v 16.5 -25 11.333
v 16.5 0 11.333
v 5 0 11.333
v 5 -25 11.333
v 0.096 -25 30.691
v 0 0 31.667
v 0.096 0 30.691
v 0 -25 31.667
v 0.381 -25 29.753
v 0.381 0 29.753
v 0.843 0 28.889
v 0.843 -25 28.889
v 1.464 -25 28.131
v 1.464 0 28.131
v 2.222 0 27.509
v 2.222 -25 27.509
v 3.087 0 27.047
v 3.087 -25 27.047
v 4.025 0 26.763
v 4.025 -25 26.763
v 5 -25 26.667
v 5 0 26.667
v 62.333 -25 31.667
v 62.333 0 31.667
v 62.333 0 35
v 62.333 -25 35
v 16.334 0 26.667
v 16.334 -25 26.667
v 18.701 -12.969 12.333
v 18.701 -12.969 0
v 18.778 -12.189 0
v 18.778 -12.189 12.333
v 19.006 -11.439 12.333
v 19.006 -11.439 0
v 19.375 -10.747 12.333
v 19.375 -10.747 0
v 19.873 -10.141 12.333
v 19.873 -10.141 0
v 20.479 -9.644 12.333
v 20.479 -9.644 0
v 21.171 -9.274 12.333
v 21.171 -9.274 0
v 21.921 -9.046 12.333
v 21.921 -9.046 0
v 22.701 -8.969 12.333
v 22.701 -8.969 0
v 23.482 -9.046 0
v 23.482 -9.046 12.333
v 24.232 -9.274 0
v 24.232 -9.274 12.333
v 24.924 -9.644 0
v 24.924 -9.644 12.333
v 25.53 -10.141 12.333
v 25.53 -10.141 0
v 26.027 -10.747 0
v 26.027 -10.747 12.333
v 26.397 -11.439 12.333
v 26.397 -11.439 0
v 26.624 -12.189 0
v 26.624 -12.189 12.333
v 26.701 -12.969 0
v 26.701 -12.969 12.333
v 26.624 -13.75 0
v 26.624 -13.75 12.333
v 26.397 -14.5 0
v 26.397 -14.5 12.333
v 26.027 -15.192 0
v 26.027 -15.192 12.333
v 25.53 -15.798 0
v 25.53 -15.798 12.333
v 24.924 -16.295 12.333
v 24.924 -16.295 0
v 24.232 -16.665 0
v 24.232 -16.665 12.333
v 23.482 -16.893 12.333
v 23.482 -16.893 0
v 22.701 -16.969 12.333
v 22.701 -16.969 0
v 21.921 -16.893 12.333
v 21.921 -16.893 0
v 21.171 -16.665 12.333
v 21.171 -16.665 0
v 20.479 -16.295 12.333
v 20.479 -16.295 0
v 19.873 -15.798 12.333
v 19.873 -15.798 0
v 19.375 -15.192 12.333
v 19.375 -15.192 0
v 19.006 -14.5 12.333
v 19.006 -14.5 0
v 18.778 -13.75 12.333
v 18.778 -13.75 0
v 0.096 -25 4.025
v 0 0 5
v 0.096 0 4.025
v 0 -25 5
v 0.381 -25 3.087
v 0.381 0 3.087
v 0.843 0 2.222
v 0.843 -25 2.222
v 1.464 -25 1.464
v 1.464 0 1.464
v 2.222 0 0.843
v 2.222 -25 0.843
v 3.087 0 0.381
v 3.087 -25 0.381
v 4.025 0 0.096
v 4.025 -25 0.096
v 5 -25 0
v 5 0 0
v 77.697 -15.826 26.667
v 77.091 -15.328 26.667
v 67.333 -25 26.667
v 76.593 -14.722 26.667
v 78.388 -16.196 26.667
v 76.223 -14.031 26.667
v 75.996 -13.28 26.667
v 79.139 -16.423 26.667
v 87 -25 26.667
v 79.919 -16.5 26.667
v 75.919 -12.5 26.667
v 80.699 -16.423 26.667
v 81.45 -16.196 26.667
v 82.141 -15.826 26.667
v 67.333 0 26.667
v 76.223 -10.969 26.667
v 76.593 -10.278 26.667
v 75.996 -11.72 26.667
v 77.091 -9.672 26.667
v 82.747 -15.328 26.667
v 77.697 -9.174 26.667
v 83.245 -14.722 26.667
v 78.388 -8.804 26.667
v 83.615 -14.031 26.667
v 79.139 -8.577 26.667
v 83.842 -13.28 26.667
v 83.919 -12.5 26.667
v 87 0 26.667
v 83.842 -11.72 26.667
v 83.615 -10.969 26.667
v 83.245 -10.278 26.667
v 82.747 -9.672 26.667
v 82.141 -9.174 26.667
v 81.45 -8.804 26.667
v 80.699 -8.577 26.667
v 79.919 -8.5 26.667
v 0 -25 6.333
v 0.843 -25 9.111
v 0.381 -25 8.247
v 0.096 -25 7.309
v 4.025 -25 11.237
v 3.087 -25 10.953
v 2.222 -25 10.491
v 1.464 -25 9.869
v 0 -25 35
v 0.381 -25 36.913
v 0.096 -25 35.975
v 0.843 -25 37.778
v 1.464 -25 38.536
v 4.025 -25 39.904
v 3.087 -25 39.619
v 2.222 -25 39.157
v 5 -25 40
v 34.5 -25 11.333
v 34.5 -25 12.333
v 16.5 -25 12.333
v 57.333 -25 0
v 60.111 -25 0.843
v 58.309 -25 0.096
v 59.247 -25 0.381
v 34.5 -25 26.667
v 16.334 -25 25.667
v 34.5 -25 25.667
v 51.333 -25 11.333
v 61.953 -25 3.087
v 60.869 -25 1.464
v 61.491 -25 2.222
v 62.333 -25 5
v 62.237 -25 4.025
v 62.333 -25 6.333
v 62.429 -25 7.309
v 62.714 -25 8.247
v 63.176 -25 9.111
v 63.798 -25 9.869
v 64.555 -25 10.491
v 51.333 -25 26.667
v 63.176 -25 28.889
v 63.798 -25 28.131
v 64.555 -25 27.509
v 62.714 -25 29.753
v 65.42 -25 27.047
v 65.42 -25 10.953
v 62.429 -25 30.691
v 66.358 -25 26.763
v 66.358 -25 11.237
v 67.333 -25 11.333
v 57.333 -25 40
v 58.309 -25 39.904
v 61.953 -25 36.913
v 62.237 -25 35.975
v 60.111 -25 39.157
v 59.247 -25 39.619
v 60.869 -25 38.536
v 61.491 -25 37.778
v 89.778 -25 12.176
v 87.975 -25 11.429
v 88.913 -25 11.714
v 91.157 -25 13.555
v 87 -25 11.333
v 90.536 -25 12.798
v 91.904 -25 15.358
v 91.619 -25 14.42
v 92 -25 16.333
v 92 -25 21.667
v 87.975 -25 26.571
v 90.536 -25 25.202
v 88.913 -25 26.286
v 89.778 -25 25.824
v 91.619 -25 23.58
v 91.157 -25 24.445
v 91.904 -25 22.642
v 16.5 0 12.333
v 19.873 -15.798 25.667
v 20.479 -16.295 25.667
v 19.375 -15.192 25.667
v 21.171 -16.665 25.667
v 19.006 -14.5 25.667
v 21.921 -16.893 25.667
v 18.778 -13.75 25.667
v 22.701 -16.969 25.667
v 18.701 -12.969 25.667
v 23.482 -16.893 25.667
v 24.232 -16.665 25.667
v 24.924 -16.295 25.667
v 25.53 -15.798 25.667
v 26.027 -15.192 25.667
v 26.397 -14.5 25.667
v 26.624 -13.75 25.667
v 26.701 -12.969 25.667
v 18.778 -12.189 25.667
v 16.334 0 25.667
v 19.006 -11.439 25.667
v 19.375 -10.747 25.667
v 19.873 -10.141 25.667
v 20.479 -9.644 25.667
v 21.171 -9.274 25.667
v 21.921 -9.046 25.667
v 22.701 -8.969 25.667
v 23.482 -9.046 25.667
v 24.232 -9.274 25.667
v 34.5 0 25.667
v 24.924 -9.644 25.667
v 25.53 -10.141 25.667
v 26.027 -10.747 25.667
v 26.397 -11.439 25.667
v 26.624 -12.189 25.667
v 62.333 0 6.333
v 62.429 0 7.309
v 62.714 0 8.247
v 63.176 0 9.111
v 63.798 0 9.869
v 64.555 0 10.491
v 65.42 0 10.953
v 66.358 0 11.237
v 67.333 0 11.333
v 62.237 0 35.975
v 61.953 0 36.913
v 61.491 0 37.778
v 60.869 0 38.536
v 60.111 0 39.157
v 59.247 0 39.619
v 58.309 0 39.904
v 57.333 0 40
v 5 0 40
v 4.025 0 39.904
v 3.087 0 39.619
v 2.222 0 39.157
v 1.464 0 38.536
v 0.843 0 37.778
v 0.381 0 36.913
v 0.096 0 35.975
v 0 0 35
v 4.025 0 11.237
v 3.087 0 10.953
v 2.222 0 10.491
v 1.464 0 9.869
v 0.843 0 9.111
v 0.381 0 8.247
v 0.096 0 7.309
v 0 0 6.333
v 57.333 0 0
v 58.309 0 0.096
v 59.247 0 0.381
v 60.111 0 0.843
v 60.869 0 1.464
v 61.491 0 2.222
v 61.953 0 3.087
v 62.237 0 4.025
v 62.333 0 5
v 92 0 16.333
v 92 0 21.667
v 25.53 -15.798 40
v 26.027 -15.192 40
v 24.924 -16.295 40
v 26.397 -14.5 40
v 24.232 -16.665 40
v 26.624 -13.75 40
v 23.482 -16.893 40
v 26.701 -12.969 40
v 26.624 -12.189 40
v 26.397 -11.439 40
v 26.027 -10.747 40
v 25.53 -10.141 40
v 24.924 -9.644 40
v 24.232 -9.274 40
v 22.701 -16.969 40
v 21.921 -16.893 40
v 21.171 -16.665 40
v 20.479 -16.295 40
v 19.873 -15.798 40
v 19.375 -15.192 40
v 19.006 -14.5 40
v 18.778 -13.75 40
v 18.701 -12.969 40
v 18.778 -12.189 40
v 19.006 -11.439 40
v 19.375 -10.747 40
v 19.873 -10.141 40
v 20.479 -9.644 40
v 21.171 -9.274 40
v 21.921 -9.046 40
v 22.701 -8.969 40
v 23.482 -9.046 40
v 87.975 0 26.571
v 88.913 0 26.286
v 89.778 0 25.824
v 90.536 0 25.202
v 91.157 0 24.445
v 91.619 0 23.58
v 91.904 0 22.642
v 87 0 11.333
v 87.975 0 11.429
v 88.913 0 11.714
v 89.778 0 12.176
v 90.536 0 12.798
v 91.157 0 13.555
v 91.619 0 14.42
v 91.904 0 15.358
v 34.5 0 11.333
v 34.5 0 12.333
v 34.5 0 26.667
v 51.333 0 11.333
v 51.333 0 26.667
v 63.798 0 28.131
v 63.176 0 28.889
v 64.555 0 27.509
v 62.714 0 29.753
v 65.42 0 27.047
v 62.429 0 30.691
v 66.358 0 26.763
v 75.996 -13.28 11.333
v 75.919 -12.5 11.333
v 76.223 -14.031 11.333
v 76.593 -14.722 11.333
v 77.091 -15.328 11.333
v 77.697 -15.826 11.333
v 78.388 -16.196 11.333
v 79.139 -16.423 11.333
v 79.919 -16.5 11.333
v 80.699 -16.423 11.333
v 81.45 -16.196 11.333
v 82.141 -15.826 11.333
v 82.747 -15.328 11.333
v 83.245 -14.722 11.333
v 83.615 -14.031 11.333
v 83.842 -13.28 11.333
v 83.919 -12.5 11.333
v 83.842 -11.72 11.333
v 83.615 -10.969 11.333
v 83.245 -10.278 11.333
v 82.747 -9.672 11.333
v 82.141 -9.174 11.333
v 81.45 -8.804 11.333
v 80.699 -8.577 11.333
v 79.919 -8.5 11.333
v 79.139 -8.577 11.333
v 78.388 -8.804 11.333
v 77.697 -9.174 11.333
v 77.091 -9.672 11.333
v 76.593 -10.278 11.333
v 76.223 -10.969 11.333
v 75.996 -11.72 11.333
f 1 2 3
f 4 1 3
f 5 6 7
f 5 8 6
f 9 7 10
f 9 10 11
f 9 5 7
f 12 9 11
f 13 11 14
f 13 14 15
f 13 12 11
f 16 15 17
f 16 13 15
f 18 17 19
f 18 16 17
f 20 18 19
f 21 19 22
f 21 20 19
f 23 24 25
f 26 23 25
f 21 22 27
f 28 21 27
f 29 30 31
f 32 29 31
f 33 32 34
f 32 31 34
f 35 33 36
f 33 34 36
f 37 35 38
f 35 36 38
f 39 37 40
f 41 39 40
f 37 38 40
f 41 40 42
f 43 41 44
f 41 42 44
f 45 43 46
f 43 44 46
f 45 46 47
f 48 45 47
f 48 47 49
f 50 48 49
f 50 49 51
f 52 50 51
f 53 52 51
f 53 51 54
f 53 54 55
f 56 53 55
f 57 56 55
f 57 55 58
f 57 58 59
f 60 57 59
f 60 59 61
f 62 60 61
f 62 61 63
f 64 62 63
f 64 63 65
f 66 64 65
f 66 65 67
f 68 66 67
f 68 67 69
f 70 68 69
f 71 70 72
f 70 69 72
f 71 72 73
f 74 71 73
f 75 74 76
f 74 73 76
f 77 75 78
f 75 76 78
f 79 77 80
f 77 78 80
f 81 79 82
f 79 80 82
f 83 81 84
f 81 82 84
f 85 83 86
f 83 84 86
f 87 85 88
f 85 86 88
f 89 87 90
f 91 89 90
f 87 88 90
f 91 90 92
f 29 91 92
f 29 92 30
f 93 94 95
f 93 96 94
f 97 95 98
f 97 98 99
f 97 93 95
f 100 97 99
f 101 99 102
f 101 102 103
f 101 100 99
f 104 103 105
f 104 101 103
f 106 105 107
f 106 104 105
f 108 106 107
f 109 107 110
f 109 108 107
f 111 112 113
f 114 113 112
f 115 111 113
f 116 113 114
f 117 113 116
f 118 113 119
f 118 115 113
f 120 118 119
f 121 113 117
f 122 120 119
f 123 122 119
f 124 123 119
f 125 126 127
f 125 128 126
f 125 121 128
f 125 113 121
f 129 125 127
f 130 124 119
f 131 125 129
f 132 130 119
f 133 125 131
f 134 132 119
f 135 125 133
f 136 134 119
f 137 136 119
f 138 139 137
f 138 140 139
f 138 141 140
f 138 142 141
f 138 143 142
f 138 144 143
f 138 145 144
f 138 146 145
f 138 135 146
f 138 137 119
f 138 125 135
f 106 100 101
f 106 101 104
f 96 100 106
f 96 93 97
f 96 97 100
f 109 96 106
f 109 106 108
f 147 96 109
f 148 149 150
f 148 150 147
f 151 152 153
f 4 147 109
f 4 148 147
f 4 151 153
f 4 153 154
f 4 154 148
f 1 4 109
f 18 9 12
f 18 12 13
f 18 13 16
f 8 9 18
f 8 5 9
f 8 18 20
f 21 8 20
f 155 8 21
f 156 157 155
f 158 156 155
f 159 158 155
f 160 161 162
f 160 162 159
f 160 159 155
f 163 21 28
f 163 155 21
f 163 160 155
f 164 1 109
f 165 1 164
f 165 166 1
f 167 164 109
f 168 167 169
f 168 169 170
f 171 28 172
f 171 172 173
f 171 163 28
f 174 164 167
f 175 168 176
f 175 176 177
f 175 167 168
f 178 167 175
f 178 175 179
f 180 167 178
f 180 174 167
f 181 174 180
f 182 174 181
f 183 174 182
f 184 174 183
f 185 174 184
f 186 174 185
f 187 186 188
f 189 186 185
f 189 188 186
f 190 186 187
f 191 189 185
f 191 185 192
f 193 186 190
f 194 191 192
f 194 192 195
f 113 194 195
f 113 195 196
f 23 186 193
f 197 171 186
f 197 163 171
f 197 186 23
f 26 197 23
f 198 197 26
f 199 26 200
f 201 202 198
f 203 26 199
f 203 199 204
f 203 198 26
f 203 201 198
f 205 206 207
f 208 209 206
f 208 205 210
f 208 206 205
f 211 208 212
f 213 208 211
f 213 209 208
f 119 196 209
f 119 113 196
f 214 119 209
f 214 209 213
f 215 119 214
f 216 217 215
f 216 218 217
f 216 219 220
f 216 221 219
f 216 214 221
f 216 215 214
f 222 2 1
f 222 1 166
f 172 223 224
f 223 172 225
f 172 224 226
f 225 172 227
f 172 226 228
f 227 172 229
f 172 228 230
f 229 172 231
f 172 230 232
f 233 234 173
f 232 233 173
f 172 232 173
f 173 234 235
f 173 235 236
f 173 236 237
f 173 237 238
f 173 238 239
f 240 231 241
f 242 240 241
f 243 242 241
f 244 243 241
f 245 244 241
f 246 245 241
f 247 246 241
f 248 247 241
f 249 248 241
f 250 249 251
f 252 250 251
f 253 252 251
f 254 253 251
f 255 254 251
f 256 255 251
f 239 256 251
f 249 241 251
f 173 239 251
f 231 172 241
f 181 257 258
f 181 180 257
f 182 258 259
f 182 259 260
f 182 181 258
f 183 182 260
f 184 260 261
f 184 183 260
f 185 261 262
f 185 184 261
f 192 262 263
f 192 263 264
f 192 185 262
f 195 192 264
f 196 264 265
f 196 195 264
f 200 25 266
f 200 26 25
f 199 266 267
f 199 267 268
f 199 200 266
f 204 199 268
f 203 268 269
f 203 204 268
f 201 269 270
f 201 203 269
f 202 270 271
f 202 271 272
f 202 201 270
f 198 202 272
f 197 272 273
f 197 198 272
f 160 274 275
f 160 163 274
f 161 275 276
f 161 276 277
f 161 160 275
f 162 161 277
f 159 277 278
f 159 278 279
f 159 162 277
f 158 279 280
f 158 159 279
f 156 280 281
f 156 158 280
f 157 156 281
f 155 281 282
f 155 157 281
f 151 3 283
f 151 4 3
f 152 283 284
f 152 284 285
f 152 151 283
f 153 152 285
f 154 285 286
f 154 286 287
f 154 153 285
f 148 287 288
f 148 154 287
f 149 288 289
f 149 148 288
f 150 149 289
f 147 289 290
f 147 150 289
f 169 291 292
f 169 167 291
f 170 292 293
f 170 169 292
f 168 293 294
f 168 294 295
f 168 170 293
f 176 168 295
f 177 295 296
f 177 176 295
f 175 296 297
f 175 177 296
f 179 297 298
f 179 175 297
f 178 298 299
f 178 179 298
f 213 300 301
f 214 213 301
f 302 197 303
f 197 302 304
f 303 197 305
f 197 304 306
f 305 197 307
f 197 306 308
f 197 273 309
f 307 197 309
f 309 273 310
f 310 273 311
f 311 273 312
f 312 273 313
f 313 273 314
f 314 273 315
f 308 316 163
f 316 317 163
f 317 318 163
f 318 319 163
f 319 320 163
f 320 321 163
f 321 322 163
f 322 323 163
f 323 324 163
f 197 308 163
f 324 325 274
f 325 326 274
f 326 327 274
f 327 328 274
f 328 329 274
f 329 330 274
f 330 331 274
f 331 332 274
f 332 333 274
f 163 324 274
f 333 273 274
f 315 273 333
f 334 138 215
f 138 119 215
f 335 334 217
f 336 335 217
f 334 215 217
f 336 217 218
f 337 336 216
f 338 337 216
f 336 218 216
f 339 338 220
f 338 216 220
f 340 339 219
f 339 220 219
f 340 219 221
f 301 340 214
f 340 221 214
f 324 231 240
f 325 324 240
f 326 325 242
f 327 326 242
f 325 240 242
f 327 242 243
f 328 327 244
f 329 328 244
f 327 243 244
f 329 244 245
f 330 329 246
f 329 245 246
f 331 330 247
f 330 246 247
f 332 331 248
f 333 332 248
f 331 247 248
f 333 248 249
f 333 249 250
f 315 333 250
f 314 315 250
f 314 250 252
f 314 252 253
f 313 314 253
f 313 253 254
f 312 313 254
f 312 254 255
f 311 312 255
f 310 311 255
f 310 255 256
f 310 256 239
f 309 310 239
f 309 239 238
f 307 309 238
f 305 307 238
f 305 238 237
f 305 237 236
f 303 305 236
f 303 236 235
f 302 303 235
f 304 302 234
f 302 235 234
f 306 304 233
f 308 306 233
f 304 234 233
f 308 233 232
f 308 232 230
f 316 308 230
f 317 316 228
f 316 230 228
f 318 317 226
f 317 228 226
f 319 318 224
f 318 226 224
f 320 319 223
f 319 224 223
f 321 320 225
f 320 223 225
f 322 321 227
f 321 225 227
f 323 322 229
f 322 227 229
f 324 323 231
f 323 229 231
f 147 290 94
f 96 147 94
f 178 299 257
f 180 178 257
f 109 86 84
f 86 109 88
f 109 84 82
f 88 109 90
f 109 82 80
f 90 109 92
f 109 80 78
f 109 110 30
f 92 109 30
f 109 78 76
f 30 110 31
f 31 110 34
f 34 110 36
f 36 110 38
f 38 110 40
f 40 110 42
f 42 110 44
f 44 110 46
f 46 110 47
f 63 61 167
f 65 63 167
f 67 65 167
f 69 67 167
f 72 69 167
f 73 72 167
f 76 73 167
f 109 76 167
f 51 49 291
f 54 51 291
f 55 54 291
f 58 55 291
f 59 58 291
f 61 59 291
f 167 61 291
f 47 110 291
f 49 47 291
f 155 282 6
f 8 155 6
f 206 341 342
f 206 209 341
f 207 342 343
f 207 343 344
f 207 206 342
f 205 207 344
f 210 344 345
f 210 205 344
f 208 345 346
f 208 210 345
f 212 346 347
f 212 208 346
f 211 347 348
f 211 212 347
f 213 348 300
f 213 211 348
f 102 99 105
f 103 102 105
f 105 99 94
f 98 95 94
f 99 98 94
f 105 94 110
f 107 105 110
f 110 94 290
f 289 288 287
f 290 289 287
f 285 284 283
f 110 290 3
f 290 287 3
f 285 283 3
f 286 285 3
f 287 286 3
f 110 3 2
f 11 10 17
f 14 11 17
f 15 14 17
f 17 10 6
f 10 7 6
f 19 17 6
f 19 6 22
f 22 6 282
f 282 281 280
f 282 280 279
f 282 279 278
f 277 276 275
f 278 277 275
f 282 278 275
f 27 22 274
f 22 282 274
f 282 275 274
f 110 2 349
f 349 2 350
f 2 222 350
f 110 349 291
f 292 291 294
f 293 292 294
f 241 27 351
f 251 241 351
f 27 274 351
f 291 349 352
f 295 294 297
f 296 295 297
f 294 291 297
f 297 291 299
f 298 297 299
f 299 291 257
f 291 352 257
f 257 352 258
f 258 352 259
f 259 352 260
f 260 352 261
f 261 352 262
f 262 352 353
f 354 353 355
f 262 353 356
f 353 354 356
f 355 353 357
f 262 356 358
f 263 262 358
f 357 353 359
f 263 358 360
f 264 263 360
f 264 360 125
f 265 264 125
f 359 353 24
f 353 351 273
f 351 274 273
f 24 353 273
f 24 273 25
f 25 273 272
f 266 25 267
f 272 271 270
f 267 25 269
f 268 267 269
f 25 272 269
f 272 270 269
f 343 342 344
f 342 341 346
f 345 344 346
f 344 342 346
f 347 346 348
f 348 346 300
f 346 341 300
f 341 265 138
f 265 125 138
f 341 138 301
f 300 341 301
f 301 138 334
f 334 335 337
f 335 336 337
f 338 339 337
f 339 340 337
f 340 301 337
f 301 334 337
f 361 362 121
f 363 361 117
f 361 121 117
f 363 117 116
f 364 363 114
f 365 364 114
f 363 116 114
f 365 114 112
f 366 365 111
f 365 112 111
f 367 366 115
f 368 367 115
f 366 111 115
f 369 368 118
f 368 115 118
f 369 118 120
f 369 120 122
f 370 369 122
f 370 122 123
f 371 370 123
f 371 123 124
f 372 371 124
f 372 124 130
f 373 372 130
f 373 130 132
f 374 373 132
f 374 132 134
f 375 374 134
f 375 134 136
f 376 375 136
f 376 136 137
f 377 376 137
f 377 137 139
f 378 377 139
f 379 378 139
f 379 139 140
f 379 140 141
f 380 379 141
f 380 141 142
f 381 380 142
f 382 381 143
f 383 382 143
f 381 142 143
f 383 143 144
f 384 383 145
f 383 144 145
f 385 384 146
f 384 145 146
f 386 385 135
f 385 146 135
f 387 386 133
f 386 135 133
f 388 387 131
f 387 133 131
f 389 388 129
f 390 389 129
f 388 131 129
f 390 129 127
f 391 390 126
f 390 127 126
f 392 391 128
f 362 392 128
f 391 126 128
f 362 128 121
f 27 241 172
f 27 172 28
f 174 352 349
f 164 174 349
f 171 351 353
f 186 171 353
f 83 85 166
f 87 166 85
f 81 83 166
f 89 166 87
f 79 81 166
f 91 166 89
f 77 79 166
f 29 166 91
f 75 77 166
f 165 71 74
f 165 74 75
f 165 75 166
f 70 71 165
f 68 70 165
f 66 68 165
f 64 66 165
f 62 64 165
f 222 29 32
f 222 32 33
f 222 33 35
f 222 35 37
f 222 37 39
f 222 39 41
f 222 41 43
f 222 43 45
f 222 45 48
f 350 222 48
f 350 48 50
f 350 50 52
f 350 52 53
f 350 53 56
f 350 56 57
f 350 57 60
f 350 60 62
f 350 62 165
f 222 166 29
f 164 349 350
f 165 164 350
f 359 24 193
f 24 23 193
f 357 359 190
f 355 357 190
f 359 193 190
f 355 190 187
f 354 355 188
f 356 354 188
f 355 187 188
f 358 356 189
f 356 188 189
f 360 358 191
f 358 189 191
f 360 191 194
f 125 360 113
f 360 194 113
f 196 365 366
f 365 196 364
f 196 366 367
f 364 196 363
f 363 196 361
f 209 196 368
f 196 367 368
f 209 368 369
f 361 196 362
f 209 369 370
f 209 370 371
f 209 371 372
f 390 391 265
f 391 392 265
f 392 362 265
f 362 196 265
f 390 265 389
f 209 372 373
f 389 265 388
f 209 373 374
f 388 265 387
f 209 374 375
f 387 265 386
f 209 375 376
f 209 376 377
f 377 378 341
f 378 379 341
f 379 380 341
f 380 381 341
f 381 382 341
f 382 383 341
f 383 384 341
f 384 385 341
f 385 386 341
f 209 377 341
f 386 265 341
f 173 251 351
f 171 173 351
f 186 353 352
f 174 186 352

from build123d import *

# Parameters (mm, degrees)
F0_W     = 18.1666671749
F0_H     = 1
F0_W_2   = 29.6666571914
F0_H_2   = 15.3333324809
F0_W_3   = 18.0000001967
F1_DEPTH = 25
F2_R     = 5
F3_R     = 5
F4_R     = 5
F5_R     = 5
F6_R     = 5
F7_R     = 5
F8_R     = 5
F9_R     = 5
F10_R    = 5
F11_R    = 5
F13_D    = 8
F15_D    = 8


with BuildPart() as f1:
    # F0 (on Front) → F1 (new body)
    with BuildSketch(Plane.XZ):
        with Locations((25.416871541, 26.1666653552)):
            Rectangle(F0_W, F0_H)
        Polygon((34.5002051284, 26.6666653552), (51.3333348415, 26.6666653552), (51.3333348415, 40), (0, 40), (0, 26.6666653552), (16.3335379536, 26.6666653552), align=None)
        Polygon((51.3333348415, 11.3333328743), (51.3333348415, 0), (62.3333337596, 0), (62.3333337596, 11.3333328743), (62.3333337596, 26.6666653552), (62.3333337596, 40), (51.3333348415, 40), (51.3333348415, 26.6666653552), align=None)
        with Locations((77.1666623552, 18.9999991148)):
            Rectangle(F0_W_2, F0_H_2)
        Polygon((0, 11.3333328743), (0, 0), (51.3333348415, 0), (51.3333348415, 11.3333328743), (34.5002051284, 11.3333328743), (16.5002049317, 11.3333328743), align=None)
        with Locations((25.5002050301, 11.8333328743)):
            Rectangle(F0_W_3, F0_H)
    extrude(amount=F1_DEPTH)

    # F2
    f2_edges = [f1.edges().sort_by_distance(p)[0] for p in [
        (62.333334, -12.5, 40),
    ]]
    fillet(f2_edges, radius=F2_R)

    # F3
    f3_edges = [f1.edges().sort_by_distance(p)[0] for p in [
        (62.333334, -12.5, 26.666665),
    ]]
    fillet(f3_edges, radius=F3_R)

    # F4
    f4_edges = [f1.edges().sort_by_distance(p)[0] for p in [
        (91.999991, -12.5, 26.666665),
    ]]
    fillet(f4_edges, radius=F4_R)

    # F5
    f5_edges = [f1.edges().sort_by_distance(p)[0] for p in [
        (0, -12.5, 40),
    ]]
    fillet(f5_edges, radius=F5_R)

    # F6
    f6_edges = [f1.edges().sort_by_distance(p)[0] for p in [
        (0, -12.5, 26.666665),
    ]]
    fillet(f6_edges, radius=F6_R)

    # F7
    f7_edges = [f1.edges().sort_by_distance(p)[0] for p in [
        (0, -12.5, 11.333333),
    ]]
    fillet(f7_edges, radius=F7_R)

    # F8
    f8_edges = [f1.edges().sort_by_distance(p)[0] for p in [
        (0, -12.5, 0),
    ]]
    fillet(f8_edges, radius=F8_R)

    # F9
    f9_edges = [f1.edges().sort_by_distance(p)[0] for p in [
        (62.333334, -12.5, 0),
    ]]
    fillet(f9_edges, radius=F9_R)

    # F10
    f10_edges = [f1.edges().sort_by_distance(p)[0] for p in [
        (62.333334, -12.5, 11.333333),
    ]]
    fillet(f10_edges, radius=F10_R)

    # F11
    f11_edges = [f1.edges().sort_by_distance(p)[0] for p in [
        (91.999991, -12.5, 11.333333),
    ]]
    fillet(f11_edges, radius=F11_R)

    # F13 (through all)
    with Locations(Plane.XY.offset(40)):
        with Locations((22.7013193071, -12.9694240168)):
            Hole(F13_D / 2)

    # F15 (through all)
    with Locations(Plane(origin=(0, 0, 11.3333328743), x_dir=(1, 0, 0), z_dir=(0, 0, -1))):
        with Locations((79.9189954996, 12.5)):
            Hole(F15_D / 2)


solid = f1.part
